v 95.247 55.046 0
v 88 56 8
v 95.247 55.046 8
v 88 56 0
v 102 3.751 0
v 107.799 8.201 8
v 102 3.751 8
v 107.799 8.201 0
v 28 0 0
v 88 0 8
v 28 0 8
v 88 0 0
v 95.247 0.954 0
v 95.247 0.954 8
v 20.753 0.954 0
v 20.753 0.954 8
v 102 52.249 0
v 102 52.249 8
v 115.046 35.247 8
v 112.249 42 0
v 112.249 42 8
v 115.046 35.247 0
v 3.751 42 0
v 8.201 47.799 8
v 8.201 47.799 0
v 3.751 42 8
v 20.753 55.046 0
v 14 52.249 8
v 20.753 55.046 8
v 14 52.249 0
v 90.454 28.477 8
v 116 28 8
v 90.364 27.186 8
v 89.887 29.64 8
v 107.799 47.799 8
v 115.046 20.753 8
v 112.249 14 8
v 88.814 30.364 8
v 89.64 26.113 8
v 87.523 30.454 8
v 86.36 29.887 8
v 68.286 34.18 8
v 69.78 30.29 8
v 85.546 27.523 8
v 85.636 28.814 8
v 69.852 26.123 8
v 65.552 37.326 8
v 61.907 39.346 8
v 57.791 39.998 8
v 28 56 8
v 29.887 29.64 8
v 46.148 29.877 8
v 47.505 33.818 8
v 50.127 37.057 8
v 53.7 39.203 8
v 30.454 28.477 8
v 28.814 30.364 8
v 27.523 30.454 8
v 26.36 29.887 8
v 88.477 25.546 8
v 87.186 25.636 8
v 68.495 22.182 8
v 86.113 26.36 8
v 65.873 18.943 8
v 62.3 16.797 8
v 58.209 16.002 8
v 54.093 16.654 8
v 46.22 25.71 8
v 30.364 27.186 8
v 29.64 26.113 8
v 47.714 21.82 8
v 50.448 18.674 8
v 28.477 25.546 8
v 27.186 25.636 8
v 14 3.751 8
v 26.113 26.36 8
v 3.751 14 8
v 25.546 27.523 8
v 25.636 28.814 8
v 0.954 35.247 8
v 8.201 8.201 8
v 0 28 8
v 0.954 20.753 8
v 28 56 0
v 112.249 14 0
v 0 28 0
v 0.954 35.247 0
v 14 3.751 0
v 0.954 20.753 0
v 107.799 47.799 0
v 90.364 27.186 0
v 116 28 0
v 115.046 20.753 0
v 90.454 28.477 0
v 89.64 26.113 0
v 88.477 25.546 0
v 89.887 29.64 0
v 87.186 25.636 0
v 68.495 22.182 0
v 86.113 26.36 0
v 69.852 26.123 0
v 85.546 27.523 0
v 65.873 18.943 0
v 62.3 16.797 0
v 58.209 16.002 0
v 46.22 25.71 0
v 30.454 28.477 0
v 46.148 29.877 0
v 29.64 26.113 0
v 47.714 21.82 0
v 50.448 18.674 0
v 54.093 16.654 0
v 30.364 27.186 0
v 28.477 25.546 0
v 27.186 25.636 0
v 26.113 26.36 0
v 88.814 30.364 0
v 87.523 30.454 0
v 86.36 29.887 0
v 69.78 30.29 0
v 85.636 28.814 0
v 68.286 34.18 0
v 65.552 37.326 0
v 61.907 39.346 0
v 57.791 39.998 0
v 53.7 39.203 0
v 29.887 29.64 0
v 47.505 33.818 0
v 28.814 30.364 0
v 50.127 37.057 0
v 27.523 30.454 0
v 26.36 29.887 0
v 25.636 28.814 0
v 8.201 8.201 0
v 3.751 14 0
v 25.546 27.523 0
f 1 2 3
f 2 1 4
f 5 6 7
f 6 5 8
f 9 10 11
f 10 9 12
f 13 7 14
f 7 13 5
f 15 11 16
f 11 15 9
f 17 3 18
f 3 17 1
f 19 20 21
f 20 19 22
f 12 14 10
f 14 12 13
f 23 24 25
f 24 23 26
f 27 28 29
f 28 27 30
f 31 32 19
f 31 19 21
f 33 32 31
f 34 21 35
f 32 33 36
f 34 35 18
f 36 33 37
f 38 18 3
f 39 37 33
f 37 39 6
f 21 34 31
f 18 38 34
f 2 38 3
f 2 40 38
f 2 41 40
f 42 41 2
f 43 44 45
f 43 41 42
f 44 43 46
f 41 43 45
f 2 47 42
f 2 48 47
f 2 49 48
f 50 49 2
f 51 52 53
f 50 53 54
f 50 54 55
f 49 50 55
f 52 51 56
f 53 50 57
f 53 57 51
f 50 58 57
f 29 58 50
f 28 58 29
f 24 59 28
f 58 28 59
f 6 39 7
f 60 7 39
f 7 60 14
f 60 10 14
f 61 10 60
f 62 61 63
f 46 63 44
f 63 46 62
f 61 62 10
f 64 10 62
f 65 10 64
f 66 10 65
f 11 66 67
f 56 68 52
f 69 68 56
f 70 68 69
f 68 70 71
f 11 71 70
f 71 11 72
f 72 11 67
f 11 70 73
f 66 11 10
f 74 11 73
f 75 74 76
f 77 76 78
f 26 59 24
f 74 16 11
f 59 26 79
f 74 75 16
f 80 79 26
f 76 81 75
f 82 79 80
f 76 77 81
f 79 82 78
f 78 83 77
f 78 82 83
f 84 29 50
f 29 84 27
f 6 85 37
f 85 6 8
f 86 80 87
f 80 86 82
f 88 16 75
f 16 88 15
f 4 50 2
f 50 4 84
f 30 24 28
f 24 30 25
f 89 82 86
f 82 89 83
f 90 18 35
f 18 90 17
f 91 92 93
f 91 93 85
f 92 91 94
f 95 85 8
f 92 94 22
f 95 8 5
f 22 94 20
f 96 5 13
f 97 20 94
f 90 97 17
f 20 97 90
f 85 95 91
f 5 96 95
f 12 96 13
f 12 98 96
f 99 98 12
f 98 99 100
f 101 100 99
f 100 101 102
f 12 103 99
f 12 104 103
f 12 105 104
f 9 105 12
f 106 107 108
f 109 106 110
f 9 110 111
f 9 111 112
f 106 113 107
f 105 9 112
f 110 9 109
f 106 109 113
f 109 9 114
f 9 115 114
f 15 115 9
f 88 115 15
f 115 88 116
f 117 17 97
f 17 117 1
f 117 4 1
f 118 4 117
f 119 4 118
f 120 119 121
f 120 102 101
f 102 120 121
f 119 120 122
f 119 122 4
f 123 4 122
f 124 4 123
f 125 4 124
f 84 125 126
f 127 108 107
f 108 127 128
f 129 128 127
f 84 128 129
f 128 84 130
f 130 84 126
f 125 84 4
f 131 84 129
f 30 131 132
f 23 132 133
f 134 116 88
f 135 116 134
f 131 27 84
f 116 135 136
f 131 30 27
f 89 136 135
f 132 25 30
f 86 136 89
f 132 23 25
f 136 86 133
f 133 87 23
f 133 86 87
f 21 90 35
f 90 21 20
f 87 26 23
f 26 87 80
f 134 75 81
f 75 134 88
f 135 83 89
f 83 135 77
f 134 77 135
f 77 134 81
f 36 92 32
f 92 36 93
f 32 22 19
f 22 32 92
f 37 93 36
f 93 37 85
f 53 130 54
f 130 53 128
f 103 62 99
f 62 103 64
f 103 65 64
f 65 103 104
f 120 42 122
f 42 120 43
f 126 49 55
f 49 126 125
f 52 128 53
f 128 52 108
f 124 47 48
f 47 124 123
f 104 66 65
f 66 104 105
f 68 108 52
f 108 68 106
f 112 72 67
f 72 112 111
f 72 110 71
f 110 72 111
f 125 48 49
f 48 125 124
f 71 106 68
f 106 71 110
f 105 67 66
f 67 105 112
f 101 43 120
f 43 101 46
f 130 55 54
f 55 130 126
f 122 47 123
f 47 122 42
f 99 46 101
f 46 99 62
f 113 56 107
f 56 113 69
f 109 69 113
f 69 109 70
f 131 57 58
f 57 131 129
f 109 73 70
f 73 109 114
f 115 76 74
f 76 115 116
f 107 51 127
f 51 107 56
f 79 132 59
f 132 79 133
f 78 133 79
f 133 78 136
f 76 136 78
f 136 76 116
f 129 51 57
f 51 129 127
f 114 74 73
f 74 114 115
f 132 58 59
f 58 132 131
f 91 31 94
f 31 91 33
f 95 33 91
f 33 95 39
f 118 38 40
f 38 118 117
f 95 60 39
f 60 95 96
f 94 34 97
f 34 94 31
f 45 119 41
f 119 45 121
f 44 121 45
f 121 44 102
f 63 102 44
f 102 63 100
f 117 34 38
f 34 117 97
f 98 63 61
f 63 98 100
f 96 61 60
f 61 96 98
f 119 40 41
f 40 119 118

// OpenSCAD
$fn = 32;

// ----------------------------------------------------------------------
// Spacer plate: obround span 60, caps R28
// ----------------------------------------------------------------------

// --- parameters (mm) ---
bore_r = 12;              // centre bore radius
bolt_r = 2.5;             // bolt hole radius
plate_t = 8;              // plate thickness, Z (extrusion height)
span = 60;                // obround span
cap_r = 28;               // cap radius

profile = [[28, 56], [20.753, 55.046], [14, 52.249], [8.201, 47.799], [3.751, 42], [0.954, 35.247], [0, 28], [0.954, 20.753], [3.751, 14], [8.201, 8.201], [14, 3.751], [20.753, 0.954], [28, 0], [88, 0], [95.247, 0.954], [102, 3.751], [107.799, 8.201], [112.249, 14], [115.046, 20.753], [116, 28], [115.046, 35.247], [112.249, 42], [107.799, 47.799], [102, 52.249], [95.247, 55.046], [88, 56]];  // primary outline, 26 points, counter clockwise
void_1 = [[69.78, 30.29], [68.286, 34.18], [65.552, 37.326], [61.907, 39.346], [57.791, 39.998], [53.7, 39.203], [50.127, 37.057], [47.505, 33.818], [46.148, 29.877], [46.22, 25.71], [47.714, 21.82], [50.448, 18.674], [54.093, 16.654], [58.209, 16.002], [62.3, 16.797], [65.873, 18.943], [68.495, 22.182], [69.852, 26.123]];  // centre bore, 18 points
void_2 = [[30.454, 28.477], [29.887, 29.64], [28.814, 30.364], [27.523, 30.454], [26.36, 29.887], [25.636, 28.814], [25.546, 27.523], [26.113, 26.36], [27.186, 25.636], [28.477, 25.546], [29.64, 26.113], [30.364, 27.186]];  // end hole, 12 points
void_3 = [[90.454, 28.477], [89.887, 29.64], [88.814, 30.364], [87.523, 30.454], [86.36, 29.887], [85.636, 28.814], [85.546, 27.523], [86.113, 26.36], [87.186, 25.636], [88.477, 25.546], [89.64, 26.113], [90.364, 27.186]];  // end hole, 12 points

// --- the one profile operation ---
difference() {
  linear_extrude(height = plate_t) polygon(points = profile);
  translate([0, 0, -1])
    linear_extrude(height = plate_t + 2) polygon(points = void_1);
  translate([0, 0, -1])
    linear_extrude(height = plate_t + 2) polygon(points = void_2);
  translate([0, 0, -1])
    linear_extrude(height = plate_t + 2) polygon(points = void_3);
}
